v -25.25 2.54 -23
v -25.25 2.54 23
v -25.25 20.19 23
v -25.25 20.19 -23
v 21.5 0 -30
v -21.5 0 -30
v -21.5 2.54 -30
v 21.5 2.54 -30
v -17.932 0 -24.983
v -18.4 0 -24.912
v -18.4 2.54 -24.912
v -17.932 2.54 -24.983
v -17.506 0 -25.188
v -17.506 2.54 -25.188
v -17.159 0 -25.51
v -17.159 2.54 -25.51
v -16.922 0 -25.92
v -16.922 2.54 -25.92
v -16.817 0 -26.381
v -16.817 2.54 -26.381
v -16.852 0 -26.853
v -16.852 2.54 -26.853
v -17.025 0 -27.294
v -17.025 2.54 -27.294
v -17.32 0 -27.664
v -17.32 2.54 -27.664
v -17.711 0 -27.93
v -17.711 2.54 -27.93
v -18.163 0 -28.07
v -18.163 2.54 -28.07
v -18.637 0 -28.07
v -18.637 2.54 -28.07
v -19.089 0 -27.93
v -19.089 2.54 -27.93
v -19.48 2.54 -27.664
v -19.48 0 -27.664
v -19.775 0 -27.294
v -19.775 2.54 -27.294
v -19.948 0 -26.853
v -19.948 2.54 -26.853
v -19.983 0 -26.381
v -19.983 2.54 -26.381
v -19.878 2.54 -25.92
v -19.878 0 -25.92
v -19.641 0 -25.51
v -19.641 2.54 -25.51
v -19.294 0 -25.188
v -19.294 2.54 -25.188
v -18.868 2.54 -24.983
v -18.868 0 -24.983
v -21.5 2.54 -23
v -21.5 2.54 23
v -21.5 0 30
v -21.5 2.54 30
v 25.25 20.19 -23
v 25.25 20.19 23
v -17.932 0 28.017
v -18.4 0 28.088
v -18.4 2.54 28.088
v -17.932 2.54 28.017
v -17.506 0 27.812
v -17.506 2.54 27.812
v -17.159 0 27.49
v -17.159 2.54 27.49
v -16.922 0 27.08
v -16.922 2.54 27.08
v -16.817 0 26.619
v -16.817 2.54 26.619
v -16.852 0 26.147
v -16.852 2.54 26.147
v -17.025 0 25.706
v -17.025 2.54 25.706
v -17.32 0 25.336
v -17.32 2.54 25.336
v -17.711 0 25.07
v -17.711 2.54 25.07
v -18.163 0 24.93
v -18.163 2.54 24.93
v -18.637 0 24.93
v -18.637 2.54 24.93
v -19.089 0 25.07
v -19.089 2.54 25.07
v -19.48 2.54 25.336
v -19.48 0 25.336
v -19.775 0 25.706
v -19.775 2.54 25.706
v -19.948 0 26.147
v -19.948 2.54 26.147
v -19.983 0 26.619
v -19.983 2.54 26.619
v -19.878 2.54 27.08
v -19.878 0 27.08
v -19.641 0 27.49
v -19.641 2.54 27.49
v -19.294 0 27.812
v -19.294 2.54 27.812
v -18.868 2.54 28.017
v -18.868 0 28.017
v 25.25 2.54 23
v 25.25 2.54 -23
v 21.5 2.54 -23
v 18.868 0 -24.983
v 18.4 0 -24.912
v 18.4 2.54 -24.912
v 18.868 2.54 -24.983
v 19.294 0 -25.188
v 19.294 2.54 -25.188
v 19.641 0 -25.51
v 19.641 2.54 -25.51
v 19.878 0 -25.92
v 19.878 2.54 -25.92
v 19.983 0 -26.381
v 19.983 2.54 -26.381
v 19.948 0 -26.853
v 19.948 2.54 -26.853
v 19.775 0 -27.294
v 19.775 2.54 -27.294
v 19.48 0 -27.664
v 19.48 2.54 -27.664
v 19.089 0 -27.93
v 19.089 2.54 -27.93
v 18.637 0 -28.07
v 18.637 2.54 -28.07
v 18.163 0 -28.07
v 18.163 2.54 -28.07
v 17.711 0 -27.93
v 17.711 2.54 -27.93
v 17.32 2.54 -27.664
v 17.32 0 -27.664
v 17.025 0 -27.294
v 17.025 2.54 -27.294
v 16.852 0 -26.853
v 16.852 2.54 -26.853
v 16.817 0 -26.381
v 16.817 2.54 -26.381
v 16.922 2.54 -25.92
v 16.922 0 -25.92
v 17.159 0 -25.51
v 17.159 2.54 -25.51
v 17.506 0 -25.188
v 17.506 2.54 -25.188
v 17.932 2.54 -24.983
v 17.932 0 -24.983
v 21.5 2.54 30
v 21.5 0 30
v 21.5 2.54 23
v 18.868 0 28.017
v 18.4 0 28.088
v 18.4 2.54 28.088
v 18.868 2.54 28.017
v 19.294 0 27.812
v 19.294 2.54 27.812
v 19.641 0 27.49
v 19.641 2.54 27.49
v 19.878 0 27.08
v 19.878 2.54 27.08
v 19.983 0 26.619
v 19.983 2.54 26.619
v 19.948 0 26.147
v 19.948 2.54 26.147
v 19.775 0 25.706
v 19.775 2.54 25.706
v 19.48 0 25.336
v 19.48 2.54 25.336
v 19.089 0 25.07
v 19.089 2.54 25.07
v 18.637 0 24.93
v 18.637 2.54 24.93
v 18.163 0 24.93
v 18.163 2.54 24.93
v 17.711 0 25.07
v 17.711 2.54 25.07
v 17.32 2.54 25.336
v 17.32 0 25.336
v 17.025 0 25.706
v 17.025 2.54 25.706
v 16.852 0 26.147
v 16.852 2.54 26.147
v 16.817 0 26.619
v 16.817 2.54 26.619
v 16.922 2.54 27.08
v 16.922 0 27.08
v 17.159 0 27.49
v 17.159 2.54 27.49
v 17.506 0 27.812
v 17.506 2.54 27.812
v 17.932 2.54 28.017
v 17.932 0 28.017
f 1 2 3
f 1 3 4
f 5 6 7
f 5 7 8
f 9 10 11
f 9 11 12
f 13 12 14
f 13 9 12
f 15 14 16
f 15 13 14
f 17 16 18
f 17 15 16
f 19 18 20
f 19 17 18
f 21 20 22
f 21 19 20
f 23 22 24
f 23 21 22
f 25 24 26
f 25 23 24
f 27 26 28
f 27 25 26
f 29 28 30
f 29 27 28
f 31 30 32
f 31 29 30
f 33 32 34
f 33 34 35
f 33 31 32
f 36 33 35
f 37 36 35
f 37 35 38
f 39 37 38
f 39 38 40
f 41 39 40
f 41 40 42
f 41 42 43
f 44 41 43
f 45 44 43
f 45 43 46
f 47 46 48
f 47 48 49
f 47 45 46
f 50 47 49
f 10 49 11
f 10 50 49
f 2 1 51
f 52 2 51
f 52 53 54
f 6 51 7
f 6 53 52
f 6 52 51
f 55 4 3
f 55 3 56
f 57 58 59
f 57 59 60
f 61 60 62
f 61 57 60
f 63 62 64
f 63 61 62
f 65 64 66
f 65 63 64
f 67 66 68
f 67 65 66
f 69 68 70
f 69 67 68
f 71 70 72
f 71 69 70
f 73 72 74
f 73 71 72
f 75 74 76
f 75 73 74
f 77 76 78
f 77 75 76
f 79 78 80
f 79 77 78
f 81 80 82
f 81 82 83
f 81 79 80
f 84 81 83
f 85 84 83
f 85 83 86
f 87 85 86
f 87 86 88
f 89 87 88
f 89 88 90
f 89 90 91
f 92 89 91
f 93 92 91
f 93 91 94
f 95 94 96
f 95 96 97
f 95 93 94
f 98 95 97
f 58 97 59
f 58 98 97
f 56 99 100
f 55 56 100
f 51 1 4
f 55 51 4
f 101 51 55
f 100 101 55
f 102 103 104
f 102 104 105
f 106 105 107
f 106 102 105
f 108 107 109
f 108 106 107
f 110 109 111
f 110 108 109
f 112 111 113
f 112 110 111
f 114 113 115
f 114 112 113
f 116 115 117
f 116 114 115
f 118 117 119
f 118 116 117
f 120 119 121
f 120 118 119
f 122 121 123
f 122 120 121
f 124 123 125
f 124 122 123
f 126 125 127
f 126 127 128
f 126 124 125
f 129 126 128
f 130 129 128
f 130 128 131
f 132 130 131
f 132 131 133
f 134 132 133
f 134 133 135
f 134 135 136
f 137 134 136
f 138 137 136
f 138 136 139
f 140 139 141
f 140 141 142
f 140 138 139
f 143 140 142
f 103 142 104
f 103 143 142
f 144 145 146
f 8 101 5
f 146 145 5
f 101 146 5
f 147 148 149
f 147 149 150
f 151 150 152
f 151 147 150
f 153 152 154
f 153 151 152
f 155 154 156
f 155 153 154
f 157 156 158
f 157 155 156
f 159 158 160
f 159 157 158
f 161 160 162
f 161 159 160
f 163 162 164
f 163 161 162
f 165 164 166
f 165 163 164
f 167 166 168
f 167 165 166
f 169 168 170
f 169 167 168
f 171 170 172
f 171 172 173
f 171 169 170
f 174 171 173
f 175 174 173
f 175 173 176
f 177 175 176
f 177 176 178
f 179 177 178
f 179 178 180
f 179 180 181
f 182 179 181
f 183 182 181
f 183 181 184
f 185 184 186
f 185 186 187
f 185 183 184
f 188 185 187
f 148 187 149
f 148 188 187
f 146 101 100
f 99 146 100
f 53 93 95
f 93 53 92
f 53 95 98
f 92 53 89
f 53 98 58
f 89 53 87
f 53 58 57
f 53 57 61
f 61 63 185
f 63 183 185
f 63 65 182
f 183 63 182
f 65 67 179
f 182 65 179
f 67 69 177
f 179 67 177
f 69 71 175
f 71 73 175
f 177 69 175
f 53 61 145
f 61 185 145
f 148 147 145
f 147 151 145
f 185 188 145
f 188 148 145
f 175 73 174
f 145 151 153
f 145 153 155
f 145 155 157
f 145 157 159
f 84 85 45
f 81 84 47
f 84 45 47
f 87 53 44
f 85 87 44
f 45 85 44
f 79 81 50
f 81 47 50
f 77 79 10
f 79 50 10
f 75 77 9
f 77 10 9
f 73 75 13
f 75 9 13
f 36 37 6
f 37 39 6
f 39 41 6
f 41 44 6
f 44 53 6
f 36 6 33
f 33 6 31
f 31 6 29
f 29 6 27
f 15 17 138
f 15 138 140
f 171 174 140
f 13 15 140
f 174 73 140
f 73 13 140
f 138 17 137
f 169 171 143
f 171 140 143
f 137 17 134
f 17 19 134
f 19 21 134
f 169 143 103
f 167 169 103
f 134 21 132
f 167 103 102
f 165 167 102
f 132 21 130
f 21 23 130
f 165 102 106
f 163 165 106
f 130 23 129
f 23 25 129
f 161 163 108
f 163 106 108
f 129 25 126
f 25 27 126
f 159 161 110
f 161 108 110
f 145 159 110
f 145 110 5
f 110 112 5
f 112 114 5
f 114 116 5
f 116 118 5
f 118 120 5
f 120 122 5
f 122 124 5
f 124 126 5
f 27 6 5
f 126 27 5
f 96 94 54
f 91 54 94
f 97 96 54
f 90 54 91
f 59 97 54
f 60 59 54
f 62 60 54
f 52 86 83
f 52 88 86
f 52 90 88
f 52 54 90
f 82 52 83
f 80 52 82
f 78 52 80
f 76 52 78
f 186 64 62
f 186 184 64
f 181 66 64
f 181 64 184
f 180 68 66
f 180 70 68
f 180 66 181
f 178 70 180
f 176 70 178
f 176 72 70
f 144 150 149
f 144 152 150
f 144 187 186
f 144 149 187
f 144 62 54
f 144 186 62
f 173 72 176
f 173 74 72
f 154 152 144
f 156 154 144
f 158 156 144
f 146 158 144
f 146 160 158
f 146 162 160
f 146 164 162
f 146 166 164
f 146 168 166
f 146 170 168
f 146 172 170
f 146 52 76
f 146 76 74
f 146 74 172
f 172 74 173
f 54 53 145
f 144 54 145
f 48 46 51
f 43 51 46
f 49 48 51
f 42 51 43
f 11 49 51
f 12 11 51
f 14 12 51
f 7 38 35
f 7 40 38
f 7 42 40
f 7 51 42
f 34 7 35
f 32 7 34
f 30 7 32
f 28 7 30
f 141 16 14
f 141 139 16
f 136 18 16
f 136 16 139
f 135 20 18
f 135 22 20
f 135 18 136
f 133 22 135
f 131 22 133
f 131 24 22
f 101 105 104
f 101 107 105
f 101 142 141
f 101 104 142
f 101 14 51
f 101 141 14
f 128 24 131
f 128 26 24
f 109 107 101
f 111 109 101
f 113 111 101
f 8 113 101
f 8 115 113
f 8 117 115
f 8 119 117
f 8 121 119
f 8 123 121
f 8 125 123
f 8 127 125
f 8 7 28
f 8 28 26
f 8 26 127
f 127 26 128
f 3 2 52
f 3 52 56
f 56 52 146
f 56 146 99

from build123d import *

# Parameters (mm, degrees)
SKETCH1_W           = 43
SKETCH1_H           = 60
SKETCH1_R           = 1.5875
BOSS_EXTRUDE1_DEPTH = 2.54
SKETCH2_W           = 50.5
SKETCH2_H           = 46
BOSS_EXTRUDE2_DEPTH = 17.65


with BuildPart() as part:
    # Sketch1 → Boss-Extrude1 (new body)
    with BuildSketch(Plane(origin=(0, 0, 0), x_dir=(1, 0, 0), z_dir=(0, 1, 0))):
        Rectangle(SKETCH1_W, SKETCH1_H)
        with Locations(Location((-18.4, 26.5, 0), (0, 0, 270))):
            Circle(SKETCH1_R, mode=Mode.SUBTRACT)
        with Locations(Location((18.4, 26.5, 0), (0, 0, 270))):
            Circle(SKETCH1_R, mode=Mode.SUBTRACT)
        with Locations(Location((18.4, -26.5, 0), (0, 0, 270))):
            Circle(SKETCH1_R, mode=Mode.SUBTRACT)
        with Locations(Location((-18.4, -26.5, 0), (0, 0, 270))):
            Circle(SKETCH1_R, mode=Mode.SUBTRACT)
    extrude(amount=BOSS_EXTRUDE1_DEPTH)

    # Sketch2 → Boss-Extrude2 (add)
    with BuildSketch(Plane(origin=(0, 2.54, 0), x_dir=(1, 0, 0), z_dir=(0, 1, 0))):
        Rectangle(SKETCH2_W, SKETCH2_H)
    extrude(amount=BOSS_EXTRUDE2_DEPTH)


solid = part.part
